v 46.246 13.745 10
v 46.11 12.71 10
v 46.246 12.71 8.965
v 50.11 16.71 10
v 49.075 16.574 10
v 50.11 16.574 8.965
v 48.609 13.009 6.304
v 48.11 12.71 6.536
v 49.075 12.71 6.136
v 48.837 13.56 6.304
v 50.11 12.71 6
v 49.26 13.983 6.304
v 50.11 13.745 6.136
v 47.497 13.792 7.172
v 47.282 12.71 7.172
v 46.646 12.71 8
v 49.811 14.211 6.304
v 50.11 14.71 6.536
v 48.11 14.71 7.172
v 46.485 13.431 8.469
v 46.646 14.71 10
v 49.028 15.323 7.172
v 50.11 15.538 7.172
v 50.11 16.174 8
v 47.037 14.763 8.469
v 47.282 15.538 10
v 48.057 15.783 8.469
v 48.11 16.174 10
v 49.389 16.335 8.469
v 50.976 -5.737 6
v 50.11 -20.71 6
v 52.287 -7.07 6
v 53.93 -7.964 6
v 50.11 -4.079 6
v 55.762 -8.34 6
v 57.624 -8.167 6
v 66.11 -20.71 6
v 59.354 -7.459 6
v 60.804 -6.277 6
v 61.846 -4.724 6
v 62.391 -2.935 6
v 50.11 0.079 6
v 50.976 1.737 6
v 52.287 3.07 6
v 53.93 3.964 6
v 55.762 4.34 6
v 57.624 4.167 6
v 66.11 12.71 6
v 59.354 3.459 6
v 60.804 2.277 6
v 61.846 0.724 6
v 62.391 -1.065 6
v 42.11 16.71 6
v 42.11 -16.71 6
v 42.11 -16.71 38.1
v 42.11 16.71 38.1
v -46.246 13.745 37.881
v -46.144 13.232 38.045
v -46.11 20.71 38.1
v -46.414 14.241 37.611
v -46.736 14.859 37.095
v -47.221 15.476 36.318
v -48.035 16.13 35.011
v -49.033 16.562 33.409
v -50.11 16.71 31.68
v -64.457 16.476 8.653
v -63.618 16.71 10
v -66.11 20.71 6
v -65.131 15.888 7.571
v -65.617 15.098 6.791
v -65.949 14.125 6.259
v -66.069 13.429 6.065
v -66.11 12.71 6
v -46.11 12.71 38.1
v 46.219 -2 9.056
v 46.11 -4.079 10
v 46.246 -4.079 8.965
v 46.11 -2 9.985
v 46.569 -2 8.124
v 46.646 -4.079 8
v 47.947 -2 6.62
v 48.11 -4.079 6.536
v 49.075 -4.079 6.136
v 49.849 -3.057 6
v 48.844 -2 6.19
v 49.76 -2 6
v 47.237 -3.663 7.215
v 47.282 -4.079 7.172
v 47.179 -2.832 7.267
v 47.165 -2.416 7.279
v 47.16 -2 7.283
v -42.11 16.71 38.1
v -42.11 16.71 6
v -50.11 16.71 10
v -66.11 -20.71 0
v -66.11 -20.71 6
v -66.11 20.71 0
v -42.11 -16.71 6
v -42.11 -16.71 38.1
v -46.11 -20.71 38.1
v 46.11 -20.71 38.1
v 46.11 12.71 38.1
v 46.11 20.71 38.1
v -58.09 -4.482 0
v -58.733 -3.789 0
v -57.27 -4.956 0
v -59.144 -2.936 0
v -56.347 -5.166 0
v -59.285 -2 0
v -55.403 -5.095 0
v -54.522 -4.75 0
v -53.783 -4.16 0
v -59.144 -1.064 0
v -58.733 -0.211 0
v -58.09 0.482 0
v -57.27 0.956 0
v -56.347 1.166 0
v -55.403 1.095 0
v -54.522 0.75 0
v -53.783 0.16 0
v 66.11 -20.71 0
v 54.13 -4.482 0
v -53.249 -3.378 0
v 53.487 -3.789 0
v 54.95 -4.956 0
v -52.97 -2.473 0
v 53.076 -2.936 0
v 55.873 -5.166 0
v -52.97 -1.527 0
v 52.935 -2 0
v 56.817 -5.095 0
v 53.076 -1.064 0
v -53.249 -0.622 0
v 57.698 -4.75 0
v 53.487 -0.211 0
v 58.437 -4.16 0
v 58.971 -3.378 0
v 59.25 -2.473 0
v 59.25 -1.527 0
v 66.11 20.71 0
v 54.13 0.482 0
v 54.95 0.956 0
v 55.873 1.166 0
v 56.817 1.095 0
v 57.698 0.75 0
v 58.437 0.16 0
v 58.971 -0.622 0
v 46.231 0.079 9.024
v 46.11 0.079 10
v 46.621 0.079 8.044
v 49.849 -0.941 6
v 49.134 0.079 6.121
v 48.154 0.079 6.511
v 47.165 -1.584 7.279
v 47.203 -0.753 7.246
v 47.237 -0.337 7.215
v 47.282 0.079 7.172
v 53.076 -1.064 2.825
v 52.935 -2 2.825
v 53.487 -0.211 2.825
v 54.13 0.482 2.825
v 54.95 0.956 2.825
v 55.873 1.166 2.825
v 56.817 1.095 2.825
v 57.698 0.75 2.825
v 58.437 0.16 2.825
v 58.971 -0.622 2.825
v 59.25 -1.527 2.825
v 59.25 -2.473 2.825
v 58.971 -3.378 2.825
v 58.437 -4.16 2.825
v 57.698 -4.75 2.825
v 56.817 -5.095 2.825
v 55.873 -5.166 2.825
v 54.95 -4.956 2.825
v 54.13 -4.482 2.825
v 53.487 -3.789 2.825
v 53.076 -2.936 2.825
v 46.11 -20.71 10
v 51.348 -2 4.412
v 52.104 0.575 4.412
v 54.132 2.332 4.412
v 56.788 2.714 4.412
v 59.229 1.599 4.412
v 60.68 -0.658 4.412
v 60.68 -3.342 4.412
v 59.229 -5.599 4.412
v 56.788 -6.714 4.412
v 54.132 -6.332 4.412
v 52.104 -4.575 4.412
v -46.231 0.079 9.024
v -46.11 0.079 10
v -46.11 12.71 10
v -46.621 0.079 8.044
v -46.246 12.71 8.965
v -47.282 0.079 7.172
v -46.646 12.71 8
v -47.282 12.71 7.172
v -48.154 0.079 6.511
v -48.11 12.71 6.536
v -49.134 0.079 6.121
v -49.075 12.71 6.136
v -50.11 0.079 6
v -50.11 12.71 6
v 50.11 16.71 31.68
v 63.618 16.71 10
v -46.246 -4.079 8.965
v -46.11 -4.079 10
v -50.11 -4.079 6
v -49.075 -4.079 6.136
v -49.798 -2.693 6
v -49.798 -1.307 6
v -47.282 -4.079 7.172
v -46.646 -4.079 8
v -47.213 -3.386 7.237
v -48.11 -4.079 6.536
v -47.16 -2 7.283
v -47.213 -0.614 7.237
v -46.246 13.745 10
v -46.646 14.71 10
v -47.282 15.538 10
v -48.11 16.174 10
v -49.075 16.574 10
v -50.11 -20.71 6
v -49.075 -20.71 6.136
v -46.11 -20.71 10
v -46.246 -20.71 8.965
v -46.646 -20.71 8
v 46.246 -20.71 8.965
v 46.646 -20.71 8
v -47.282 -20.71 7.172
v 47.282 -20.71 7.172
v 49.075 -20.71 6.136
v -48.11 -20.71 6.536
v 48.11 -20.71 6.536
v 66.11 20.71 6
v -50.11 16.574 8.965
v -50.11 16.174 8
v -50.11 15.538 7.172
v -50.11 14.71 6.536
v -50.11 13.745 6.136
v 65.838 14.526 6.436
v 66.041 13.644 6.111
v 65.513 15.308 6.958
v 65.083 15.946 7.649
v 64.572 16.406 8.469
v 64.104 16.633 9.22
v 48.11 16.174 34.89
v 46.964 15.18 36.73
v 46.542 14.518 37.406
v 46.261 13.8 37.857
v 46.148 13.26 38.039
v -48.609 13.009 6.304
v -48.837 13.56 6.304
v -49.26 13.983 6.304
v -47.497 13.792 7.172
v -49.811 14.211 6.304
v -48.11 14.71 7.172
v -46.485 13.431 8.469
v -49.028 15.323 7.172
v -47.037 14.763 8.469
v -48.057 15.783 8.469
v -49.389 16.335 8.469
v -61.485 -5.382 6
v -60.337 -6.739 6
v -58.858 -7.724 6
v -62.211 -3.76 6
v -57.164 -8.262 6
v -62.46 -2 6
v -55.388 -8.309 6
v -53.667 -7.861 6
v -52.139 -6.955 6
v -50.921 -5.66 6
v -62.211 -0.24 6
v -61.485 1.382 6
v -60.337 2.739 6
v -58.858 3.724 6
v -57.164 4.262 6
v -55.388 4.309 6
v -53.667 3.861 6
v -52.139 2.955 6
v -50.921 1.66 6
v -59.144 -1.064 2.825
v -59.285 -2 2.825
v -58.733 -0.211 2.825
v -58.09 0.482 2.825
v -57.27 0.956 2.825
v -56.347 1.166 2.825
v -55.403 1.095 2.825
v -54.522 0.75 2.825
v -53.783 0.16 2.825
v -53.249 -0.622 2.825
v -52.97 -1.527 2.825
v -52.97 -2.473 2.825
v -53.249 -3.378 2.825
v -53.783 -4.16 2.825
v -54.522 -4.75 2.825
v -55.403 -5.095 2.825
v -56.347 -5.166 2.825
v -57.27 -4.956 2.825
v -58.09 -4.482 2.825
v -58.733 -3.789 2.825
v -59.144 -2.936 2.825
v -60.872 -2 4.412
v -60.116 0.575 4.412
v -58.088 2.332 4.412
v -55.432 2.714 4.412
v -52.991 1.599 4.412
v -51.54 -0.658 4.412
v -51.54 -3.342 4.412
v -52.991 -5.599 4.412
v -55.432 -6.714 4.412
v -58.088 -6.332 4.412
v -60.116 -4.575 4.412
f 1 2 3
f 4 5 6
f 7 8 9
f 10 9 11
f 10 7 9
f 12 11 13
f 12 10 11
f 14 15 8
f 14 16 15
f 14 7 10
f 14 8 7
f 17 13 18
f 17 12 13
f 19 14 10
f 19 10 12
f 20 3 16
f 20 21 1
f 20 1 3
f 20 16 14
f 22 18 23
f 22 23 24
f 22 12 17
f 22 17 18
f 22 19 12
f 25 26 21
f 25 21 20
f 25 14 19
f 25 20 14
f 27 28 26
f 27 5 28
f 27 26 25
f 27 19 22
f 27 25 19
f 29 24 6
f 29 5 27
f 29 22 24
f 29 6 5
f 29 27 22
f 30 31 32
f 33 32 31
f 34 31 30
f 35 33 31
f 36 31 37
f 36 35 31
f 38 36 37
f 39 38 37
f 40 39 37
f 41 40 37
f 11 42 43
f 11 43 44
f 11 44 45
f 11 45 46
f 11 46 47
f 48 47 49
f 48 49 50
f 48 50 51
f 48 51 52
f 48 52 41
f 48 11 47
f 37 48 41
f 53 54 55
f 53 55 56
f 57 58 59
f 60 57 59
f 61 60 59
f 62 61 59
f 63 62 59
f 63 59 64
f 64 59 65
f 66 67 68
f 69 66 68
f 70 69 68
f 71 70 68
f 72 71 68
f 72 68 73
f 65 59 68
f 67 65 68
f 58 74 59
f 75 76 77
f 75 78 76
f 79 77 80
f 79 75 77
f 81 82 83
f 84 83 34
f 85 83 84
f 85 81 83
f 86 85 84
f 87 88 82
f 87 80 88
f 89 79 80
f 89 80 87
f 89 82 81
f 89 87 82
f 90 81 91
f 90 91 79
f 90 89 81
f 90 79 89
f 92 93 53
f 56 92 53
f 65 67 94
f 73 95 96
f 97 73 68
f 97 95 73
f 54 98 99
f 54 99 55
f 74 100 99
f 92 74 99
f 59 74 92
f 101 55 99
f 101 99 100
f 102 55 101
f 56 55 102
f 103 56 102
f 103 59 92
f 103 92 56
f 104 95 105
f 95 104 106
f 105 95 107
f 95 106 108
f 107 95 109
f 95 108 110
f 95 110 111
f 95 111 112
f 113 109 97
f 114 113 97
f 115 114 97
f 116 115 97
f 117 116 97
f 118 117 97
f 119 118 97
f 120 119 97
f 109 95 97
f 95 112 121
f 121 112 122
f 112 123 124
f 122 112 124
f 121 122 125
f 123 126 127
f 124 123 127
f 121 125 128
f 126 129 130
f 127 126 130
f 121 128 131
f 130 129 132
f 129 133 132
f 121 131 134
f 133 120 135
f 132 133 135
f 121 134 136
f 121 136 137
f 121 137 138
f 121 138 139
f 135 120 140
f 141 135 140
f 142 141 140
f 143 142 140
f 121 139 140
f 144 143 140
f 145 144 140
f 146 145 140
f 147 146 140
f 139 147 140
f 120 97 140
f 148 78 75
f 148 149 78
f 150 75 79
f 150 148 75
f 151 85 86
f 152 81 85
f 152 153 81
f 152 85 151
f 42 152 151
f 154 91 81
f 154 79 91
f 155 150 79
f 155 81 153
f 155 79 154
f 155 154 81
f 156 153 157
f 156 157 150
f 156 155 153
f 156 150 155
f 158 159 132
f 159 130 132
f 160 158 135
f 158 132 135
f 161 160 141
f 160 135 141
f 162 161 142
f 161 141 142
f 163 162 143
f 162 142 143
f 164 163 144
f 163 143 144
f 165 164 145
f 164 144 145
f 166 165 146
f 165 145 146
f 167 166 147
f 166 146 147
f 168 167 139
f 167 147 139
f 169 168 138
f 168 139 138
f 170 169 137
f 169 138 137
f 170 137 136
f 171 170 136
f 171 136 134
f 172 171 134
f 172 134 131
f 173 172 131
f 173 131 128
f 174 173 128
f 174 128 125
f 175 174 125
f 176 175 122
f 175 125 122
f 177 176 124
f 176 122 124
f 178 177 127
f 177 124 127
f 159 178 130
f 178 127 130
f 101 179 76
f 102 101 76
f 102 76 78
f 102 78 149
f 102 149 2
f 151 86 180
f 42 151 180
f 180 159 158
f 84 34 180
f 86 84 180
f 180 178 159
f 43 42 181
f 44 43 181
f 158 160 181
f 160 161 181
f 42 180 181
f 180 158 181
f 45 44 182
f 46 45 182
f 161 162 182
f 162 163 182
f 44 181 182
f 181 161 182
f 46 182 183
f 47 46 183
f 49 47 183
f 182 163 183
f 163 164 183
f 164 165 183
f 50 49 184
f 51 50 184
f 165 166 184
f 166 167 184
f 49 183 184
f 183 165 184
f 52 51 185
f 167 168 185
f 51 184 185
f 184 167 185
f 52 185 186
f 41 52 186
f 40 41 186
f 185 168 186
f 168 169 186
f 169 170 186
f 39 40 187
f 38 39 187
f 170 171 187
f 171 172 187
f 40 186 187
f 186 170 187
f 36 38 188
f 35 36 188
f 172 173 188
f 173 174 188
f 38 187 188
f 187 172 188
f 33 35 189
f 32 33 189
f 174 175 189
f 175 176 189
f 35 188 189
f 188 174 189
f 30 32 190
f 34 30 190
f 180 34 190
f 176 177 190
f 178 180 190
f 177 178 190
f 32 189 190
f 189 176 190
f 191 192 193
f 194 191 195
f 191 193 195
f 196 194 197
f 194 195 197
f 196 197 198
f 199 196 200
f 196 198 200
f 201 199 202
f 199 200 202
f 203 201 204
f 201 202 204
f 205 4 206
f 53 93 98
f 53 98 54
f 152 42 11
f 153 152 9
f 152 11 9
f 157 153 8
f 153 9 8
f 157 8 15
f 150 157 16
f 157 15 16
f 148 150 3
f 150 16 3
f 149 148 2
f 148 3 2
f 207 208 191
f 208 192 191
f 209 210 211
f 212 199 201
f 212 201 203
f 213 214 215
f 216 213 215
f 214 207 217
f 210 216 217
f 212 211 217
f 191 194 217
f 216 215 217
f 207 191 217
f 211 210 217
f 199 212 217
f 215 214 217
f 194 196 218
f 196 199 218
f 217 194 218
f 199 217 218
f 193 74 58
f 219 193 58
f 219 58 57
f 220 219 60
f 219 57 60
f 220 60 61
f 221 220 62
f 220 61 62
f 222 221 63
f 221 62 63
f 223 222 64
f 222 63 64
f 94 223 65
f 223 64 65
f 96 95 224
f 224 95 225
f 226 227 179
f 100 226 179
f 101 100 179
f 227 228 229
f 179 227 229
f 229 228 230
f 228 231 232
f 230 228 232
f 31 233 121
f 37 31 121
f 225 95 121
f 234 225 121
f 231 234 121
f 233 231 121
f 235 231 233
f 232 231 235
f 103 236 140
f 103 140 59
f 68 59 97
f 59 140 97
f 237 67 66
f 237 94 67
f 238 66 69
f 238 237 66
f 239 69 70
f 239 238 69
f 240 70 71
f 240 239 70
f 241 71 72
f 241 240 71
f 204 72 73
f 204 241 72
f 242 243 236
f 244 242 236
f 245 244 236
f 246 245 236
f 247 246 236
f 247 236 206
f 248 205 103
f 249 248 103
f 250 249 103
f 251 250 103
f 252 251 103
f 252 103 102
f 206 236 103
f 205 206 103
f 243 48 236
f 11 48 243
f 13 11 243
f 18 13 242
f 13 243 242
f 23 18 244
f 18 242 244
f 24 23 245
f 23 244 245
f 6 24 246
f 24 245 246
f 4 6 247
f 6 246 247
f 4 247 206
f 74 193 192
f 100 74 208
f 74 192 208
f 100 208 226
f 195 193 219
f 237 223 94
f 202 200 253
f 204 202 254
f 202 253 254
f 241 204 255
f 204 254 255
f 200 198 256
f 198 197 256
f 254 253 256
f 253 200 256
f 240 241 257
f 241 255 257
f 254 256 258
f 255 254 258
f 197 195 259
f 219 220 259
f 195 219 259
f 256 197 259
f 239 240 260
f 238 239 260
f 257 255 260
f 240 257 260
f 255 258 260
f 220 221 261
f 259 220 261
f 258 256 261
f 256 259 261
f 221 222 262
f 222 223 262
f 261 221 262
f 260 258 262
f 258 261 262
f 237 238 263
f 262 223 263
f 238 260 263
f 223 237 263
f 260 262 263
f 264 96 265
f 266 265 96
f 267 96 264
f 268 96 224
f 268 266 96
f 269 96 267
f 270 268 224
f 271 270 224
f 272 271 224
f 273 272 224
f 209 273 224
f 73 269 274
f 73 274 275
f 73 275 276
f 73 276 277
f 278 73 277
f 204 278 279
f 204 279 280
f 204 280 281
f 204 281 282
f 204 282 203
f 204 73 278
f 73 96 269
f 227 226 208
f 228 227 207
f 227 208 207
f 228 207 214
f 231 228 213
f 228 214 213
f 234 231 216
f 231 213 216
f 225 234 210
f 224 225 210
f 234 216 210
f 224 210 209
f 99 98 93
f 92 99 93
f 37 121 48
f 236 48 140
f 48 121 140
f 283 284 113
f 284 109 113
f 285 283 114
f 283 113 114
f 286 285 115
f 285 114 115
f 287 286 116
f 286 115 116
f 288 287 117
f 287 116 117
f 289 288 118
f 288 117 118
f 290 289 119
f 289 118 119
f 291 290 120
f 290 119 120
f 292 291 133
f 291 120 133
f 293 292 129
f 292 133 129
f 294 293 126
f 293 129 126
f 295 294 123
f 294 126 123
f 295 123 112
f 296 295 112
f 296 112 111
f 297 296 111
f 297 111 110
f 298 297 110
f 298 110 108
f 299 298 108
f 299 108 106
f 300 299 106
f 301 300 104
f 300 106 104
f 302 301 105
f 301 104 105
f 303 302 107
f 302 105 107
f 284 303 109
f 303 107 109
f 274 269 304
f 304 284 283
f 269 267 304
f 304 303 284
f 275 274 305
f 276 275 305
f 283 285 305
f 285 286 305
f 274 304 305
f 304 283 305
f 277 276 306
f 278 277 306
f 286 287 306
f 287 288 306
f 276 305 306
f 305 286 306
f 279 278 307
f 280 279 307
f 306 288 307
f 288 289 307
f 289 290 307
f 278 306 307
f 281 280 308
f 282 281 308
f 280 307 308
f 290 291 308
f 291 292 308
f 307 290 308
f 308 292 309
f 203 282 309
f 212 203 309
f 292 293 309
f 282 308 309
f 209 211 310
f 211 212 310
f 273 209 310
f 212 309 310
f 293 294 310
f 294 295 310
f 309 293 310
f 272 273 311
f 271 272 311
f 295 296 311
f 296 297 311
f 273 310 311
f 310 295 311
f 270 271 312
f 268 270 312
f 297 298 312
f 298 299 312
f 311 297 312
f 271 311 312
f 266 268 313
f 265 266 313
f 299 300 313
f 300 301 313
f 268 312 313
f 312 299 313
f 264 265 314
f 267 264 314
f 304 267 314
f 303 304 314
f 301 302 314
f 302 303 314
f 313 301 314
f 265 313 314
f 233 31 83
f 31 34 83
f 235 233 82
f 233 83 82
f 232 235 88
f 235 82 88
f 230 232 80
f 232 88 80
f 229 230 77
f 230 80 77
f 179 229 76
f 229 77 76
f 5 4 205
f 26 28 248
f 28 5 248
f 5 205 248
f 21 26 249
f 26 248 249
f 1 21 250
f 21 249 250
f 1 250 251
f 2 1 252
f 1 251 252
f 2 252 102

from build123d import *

# Parameters (mm, degrees)
F0_W           = 84.22
F0_H           = 33.42
F0_W_2         = 20
F0_H_2         = 4
F1_DEPTH       = 38.1
F0_H_3         = 37.42
F2_DEPTH       = 6
F4_D           = 6.35
F4_CSINK_D     = 12.7
F4_CSINK_ANGLE = 90
F6_DEPTH       = 25
F7_R           = 4


with BuildPart() as f1:
    # F0 (on Top) → F1 (new body)
    with BuildSketch(Plane.XY):
        Polygon((46.11, 16.71), (46.11, 20.71), (-46.11, 20.71), (-46.11, 16.71), (-46.11, -20.71), (46.11, -20.71), align=None)
        Rectangle(F0_W, F0_H, mode=Mode.SUBTRACT)
        with Locations((56.11, 18.71)):
            Rectangle(F0_W_2, F0_H_2)
        with Locations((-56.11, 18.71)):
            Rectangle(F0_W_2, F0_H_2)
    extrude(amount=F1_DEPTH)

    # F0 (on Top) → F2 (join)
    with BuildSketch(Plane.XY):
        with Locations((-56.11, -2)):
            Rectangle(F0_W_2, F0_H_3)
        with Locations((56.11, -2)):
            Rectangle(F0_W_2, F0_H_3)
        Rectangle(F0_W, F0_H)
    extrude(amount=F2_DEPTH)

    # F4 (through all)
    with Locations(Plane.XY.offset(6)):
        with Locations((-56.11, -2), (56.11, -2)):
            CounterSinkHole(F4_D / 2, F4_CSINK_D / 2, counter_sink_angle=F4_CSINK_ANGLE)

    # F5 (on face) → F6 (cut)
    with BuildSketch(Plane(origin=(0, 20.71, 0), x_dir=(-1, 0, 0), z_dir=(0, 1, 0))):
        Polygon((-66.11, 6), (-46.11, 38.1), (-66.11, 38.1), align=None)
        Polygon((66.11, 38.1), (46.11, 38.1), (66.11, 6), align=None)
    extrude(amount=-F6_DEPTH, mode=Mode.SUBTRACT)

    # F7
    f7_edges = [f1.edges().sort_by_distance(p)[0] for p in [
        (46.11, 16.71, 22.05),
        (-46.11, 16.71, 22.05),
        (-46.11, -2, 6),
        (-56.11, 16.71, 6),
        (46.11, -2, 6),
        (56.11, 16.71, 6),
    ]]
    fillet(f7_edges, radius=F7_R)


solid = f1.part
